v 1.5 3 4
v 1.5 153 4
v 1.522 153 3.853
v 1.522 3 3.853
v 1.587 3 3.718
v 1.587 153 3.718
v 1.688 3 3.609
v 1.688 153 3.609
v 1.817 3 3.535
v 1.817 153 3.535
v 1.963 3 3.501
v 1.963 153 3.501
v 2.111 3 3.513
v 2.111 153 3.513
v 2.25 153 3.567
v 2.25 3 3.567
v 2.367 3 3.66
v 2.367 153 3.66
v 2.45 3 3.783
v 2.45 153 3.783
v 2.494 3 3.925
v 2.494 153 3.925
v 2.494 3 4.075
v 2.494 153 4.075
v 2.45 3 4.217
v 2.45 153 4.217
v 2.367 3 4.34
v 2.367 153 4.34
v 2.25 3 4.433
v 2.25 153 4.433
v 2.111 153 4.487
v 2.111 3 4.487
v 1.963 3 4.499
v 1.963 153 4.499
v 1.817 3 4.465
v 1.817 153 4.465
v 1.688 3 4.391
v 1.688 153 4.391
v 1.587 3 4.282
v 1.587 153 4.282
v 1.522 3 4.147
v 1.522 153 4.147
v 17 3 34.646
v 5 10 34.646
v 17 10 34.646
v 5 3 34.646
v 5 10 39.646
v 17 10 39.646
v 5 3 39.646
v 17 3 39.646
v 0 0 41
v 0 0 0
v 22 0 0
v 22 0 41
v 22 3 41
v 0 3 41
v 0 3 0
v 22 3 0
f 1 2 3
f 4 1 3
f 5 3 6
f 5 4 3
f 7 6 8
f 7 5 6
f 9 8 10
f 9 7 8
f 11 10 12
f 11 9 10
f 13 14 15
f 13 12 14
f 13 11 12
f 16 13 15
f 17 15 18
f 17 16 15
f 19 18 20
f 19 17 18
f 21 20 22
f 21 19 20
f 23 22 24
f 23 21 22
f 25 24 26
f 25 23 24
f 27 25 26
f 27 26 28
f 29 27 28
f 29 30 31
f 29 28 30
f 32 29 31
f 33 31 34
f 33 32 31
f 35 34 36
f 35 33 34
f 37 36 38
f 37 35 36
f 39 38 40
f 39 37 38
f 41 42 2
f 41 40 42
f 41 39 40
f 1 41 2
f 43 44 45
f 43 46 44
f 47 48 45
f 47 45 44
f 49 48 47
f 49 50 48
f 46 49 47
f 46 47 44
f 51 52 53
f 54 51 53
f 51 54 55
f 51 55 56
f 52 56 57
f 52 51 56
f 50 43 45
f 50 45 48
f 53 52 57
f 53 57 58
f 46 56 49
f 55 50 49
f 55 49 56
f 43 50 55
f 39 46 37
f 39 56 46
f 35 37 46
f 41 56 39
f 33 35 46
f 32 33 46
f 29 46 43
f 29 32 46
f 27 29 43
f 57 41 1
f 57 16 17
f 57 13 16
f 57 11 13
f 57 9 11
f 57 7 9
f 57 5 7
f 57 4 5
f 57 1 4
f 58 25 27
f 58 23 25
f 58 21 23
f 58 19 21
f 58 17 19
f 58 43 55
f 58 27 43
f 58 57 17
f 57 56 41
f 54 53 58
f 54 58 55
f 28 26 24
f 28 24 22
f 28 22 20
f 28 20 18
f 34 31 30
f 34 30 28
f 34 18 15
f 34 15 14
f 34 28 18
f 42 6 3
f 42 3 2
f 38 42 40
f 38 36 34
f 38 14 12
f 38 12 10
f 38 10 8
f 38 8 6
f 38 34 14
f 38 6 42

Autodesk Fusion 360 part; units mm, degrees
sketch "Sketch1" plane through (0, 0, 0) normal (0, 1, 0) x (1, 0, 0)
  line L0 (0, 0) -> (22, 0)
  line L1 (22, 0) -> (22, -41)
  line L2 (22, -41) -> (0, -41)
  line L3 (0, -41) -> (0, 0)
  dimension "d1" = 22
  dimension "d2" = 41
extrude "Extrude1" add sketch "Sketch1" along normal blind 3
sketch "Sketch2" plane through (0, 3, 0) normal (0, 1, 0) x (-1, 0, 0)
  line L0 (0, 41) -> (-22, 41)
  line L1 (-22, 41) -> (-22, 0)
  line L2 (-22, 0) -> (0, 0)
  line L3 (0, 0) -> (0, 41)
  line L4 (-5, 34.6463) -> (-17, 34.6463)
  line L5 (-17, 34.6463) -> (-17, 39.6463)
  line L6 (-17, 39.6463) -> (-5, 39.6463)
  line L7 (-5, 39.6463) -> (-5, 34.6463)
  dimension "d5" = 12
  dimension "d6" = 5
  dimension "d7" = 5
  dimension "d8" = 5
extrude "Extrude2" add sketch "Sketch2" along normal blind 7 contours L4 L5 L6 L7
sketch "Sketch3" plane through (0, 3, 0) normal (0, 1, 0) x (-1, 0, 0)
  line L0 (-5, 39.6463) -> (-5, 34.6463)
  line L1 (-5, 34.6463) -> (-17, 34.6463)
  line L2 (-17, 34.6463) -> (-17, 39.6463)
  line L3 (-17, 39.6463) -> (-5, 39.6463)
  line L4 (0, 41) -> (-22, 41)
  line L5 (-22, 41) -> (-22, 0)
  line L6 (-22, 0) -> (0, 0)
  line L7 (0, 0) -> (0, 41)
  circle A0 centre (-2, 4) radius 0.5
  dimension "d11" = 1
extrude "Extrude3" add sketch "Sketch3" along normal blind 150 contours A0
